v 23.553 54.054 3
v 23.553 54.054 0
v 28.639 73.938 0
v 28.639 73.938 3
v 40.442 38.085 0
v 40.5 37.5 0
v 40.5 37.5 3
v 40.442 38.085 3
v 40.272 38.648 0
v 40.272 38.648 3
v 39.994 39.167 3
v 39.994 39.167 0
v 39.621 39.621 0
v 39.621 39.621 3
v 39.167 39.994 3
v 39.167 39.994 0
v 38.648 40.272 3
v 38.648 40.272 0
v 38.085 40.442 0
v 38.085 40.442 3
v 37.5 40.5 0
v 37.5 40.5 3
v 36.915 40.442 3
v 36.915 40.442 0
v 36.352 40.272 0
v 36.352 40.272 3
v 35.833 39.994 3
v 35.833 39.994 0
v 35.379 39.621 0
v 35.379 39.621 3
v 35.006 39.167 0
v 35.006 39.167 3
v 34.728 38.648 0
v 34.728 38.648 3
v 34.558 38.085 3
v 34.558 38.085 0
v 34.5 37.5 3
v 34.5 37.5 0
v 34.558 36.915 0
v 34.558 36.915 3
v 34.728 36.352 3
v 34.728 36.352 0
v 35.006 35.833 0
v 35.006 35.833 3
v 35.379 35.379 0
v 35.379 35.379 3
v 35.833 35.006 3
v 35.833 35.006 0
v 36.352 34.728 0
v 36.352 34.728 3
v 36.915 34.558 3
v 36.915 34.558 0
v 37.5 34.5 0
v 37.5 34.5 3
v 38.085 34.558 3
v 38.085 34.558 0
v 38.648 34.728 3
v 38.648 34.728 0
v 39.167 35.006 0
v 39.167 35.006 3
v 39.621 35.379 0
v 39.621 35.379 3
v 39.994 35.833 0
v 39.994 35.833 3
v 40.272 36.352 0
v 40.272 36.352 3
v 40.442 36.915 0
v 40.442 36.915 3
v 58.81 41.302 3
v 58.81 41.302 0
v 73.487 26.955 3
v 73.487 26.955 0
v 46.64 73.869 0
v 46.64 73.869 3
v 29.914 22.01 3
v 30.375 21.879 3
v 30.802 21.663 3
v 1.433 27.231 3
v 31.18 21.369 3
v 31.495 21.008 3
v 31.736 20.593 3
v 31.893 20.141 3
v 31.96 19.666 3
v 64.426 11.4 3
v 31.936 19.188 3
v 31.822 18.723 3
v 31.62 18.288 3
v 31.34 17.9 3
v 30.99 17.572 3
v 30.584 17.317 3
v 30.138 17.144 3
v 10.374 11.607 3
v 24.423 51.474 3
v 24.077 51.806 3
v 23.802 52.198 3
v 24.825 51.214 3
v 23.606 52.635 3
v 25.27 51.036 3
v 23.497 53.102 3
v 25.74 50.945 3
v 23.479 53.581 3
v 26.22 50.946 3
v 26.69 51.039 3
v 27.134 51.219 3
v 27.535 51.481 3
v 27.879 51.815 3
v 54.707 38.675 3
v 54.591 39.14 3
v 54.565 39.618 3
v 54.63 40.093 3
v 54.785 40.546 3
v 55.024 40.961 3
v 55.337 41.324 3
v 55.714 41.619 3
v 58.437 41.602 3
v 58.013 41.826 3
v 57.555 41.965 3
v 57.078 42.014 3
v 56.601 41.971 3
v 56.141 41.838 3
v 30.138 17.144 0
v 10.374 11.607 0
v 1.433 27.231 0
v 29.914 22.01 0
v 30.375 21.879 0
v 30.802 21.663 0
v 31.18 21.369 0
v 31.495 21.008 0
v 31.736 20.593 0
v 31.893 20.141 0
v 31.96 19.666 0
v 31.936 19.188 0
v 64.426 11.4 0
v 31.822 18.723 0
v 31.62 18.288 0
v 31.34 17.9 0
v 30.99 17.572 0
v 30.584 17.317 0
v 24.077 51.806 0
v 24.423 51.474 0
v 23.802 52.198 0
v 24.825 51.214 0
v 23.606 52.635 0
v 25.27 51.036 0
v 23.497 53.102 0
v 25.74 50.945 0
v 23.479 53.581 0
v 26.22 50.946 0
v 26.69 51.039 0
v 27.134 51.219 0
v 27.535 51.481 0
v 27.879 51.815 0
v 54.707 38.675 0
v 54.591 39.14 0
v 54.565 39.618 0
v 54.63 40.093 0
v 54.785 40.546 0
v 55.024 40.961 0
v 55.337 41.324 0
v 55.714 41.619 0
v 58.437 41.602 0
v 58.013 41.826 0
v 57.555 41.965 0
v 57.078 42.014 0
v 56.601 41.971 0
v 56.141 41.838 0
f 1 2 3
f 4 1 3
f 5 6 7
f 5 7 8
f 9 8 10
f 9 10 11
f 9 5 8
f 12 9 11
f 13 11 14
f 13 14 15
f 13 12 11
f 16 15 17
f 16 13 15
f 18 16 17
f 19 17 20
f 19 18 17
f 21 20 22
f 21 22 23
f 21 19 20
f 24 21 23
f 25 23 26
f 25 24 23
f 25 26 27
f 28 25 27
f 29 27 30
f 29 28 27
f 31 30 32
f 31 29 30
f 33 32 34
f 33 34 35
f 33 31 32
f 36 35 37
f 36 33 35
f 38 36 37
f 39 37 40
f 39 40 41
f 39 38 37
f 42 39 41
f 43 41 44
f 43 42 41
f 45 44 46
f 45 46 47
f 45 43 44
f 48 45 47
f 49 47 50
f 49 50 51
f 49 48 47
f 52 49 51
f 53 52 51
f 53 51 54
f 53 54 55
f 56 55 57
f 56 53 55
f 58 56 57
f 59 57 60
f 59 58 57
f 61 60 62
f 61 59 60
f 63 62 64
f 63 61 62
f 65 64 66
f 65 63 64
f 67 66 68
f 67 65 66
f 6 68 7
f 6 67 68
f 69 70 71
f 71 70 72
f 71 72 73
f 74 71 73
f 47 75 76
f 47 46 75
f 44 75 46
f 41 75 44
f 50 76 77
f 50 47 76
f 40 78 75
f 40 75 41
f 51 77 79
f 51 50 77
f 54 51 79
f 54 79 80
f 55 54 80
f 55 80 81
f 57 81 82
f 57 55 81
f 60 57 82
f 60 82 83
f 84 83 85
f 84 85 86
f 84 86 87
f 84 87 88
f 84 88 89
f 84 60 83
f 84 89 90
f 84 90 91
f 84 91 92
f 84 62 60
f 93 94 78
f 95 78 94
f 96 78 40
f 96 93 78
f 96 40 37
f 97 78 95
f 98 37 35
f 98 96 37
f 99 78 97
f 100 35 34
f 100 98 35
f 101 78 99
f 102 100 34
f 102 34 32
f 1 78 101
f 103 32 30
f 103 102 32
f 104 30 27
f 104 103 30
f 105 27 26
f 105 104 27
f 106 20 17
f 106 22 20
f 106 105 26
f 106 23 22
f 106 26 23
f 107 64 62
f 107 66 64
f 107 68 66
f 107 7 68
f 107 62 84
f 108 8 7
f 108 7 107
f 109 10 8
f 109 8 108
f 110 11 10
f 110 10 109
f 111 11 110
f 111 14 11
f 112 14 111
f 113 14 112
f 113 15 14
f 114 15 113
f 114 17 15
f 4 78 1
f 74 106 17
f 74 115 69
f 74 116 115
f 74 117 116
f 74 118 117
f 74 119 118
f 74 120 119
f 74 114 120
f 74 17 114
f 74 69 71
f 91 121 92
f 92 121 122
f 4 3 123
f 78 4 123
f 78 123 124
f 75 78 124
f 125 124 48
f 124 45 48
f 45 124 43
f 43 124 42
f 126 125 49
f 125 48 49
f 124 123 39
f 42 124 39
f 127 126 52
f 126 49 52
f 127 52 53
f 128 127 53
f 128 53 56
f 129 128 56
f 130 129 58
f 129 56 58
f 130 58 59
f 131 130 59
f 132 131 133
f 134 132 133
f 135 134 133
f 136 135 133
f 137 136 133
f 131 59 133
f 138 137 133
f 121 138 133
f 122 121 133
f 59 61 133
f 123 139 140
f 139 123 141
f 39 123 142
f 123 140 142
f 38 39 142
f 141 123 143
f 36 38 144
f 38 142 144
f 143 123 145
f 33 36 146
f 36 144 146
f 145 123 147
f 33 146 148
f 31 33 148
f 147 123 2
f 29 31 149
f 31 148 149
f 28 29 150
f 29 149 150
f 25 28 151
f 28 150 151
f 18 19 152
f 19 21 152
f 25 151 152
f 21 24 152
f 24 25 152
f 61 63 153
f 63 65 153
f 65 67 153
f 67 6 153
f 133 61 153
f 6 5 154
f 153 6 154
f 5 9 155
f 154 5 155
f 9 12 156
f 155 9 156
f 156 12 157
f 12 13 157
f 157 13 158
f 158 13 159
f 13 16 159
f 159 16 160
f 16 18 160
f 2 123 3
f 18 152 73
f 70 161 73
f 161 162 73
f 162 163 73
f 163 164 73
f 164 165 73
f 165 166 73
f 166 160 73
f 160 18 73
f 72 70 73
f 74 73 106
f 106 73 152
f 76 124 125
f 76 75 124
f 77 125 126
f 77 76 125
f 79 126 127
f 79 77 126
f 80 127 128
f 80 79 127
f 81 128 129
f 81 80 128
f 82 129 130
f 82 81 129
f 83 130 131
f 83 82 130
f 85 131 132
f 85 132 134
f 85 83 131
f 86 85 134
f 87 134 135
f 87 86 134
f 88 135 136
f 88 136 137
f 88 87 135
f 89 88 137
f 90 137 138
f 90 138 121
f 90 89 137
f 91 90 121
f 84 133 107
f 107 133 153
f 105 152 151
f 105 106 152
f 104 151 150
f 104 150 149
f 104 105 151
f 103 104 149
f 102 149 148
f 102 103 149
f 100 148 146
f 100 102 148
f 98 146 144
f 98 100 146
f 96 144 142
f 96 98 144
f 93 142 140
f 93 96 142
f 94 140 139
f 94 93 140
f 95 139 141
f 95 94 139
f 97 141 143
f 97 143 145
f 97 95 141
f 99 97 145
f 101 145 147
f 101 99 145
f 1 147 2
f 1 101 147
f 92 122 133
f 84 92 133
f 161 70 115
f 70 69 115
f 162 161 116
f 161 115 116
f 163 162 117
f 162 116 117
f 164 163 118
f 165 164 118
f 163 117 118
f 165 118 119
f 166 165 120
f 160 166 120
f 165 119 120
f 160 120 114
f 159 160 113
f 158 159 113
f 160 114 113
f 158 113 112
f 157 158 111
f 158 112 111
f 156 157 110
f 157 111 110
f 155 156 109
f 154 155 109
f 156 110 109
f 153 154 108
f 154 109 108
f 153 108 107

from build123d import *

# Parameters (mm, degrees)
F0_R     = 3
F1_DEPTH = 3
F2_DEPTH = 3
F3_R     = 2.5
F4_R     = 2.5
F5_R     = 2.5


# Not quite as in the source:
# - a feature names something its author has since deleted; it is built from what else it names


with BuildPart() as f1:
    # F0 (on Top) → F1 (new body)
    with BuildSketch(Plane.XY):
        Polygon((73.486745642, 26.9546627321), (46.6403742633, 73.8689917145), (20.8729718881, 43.5791923222), (28.6391571445, 73.9381045595), (1.4333421336, 27.2313004548), (40.5487790704, 20.0609751046), (10.3740972135, 11.6072327084), (64.4262836031, 11.3997078307), (51.0782490415, 48.8598325732), align=None)
        with Locations((37.5, 37.5)):
            Circle(F0_R, mode=Mode.SUBTRACT)
    extrude(amount=F1_DEPTH)

    # F0 (on Top) → F2 (join)
    with BuildSketch(Plane.XY):
        Polygon((73.486745642, 26.9546627321), (46.6403742633, 73.8689917145), (20.8729718881, 43.5791923222), (28.6391571445, 73.9381045595), (1.4333421336, 27.2313004548), (40.5487790704, 20.0609751046), (10.3740972135, 11.6072327084), (64.4262836031, 11.3997078307), (51.0782490415, 48.8598325732), align=None)
        with Locations((37.5, 37.5)):
            Circle(F0_R, mode=Mode.SUBTRACT)
    extrude(amount=F2_DEPTH)

    # F3
    f3_edges = [f1.edges().sort_by_distance(p)[0] for p in [
        (51.078249, 48.859833, 1.5),
    ]]
    fillet(f3_edges, radius=F3_R)

    # F4
    f4_edges = [f1.edges().sort_by_distance(p)[0] for p in [
        (20.872972, 43.579192, 1.5),
    ]]
    fillet(f4_edges, radius=F4_R)

    # F5
    f5_edges = [f1.edges().sort_by_distance(p)[0] for p in [
        (40.548779, 20.060975, 1.5),
    ]]
    fillet(f5_edges, radius=F5_R)


solid = f1.part
